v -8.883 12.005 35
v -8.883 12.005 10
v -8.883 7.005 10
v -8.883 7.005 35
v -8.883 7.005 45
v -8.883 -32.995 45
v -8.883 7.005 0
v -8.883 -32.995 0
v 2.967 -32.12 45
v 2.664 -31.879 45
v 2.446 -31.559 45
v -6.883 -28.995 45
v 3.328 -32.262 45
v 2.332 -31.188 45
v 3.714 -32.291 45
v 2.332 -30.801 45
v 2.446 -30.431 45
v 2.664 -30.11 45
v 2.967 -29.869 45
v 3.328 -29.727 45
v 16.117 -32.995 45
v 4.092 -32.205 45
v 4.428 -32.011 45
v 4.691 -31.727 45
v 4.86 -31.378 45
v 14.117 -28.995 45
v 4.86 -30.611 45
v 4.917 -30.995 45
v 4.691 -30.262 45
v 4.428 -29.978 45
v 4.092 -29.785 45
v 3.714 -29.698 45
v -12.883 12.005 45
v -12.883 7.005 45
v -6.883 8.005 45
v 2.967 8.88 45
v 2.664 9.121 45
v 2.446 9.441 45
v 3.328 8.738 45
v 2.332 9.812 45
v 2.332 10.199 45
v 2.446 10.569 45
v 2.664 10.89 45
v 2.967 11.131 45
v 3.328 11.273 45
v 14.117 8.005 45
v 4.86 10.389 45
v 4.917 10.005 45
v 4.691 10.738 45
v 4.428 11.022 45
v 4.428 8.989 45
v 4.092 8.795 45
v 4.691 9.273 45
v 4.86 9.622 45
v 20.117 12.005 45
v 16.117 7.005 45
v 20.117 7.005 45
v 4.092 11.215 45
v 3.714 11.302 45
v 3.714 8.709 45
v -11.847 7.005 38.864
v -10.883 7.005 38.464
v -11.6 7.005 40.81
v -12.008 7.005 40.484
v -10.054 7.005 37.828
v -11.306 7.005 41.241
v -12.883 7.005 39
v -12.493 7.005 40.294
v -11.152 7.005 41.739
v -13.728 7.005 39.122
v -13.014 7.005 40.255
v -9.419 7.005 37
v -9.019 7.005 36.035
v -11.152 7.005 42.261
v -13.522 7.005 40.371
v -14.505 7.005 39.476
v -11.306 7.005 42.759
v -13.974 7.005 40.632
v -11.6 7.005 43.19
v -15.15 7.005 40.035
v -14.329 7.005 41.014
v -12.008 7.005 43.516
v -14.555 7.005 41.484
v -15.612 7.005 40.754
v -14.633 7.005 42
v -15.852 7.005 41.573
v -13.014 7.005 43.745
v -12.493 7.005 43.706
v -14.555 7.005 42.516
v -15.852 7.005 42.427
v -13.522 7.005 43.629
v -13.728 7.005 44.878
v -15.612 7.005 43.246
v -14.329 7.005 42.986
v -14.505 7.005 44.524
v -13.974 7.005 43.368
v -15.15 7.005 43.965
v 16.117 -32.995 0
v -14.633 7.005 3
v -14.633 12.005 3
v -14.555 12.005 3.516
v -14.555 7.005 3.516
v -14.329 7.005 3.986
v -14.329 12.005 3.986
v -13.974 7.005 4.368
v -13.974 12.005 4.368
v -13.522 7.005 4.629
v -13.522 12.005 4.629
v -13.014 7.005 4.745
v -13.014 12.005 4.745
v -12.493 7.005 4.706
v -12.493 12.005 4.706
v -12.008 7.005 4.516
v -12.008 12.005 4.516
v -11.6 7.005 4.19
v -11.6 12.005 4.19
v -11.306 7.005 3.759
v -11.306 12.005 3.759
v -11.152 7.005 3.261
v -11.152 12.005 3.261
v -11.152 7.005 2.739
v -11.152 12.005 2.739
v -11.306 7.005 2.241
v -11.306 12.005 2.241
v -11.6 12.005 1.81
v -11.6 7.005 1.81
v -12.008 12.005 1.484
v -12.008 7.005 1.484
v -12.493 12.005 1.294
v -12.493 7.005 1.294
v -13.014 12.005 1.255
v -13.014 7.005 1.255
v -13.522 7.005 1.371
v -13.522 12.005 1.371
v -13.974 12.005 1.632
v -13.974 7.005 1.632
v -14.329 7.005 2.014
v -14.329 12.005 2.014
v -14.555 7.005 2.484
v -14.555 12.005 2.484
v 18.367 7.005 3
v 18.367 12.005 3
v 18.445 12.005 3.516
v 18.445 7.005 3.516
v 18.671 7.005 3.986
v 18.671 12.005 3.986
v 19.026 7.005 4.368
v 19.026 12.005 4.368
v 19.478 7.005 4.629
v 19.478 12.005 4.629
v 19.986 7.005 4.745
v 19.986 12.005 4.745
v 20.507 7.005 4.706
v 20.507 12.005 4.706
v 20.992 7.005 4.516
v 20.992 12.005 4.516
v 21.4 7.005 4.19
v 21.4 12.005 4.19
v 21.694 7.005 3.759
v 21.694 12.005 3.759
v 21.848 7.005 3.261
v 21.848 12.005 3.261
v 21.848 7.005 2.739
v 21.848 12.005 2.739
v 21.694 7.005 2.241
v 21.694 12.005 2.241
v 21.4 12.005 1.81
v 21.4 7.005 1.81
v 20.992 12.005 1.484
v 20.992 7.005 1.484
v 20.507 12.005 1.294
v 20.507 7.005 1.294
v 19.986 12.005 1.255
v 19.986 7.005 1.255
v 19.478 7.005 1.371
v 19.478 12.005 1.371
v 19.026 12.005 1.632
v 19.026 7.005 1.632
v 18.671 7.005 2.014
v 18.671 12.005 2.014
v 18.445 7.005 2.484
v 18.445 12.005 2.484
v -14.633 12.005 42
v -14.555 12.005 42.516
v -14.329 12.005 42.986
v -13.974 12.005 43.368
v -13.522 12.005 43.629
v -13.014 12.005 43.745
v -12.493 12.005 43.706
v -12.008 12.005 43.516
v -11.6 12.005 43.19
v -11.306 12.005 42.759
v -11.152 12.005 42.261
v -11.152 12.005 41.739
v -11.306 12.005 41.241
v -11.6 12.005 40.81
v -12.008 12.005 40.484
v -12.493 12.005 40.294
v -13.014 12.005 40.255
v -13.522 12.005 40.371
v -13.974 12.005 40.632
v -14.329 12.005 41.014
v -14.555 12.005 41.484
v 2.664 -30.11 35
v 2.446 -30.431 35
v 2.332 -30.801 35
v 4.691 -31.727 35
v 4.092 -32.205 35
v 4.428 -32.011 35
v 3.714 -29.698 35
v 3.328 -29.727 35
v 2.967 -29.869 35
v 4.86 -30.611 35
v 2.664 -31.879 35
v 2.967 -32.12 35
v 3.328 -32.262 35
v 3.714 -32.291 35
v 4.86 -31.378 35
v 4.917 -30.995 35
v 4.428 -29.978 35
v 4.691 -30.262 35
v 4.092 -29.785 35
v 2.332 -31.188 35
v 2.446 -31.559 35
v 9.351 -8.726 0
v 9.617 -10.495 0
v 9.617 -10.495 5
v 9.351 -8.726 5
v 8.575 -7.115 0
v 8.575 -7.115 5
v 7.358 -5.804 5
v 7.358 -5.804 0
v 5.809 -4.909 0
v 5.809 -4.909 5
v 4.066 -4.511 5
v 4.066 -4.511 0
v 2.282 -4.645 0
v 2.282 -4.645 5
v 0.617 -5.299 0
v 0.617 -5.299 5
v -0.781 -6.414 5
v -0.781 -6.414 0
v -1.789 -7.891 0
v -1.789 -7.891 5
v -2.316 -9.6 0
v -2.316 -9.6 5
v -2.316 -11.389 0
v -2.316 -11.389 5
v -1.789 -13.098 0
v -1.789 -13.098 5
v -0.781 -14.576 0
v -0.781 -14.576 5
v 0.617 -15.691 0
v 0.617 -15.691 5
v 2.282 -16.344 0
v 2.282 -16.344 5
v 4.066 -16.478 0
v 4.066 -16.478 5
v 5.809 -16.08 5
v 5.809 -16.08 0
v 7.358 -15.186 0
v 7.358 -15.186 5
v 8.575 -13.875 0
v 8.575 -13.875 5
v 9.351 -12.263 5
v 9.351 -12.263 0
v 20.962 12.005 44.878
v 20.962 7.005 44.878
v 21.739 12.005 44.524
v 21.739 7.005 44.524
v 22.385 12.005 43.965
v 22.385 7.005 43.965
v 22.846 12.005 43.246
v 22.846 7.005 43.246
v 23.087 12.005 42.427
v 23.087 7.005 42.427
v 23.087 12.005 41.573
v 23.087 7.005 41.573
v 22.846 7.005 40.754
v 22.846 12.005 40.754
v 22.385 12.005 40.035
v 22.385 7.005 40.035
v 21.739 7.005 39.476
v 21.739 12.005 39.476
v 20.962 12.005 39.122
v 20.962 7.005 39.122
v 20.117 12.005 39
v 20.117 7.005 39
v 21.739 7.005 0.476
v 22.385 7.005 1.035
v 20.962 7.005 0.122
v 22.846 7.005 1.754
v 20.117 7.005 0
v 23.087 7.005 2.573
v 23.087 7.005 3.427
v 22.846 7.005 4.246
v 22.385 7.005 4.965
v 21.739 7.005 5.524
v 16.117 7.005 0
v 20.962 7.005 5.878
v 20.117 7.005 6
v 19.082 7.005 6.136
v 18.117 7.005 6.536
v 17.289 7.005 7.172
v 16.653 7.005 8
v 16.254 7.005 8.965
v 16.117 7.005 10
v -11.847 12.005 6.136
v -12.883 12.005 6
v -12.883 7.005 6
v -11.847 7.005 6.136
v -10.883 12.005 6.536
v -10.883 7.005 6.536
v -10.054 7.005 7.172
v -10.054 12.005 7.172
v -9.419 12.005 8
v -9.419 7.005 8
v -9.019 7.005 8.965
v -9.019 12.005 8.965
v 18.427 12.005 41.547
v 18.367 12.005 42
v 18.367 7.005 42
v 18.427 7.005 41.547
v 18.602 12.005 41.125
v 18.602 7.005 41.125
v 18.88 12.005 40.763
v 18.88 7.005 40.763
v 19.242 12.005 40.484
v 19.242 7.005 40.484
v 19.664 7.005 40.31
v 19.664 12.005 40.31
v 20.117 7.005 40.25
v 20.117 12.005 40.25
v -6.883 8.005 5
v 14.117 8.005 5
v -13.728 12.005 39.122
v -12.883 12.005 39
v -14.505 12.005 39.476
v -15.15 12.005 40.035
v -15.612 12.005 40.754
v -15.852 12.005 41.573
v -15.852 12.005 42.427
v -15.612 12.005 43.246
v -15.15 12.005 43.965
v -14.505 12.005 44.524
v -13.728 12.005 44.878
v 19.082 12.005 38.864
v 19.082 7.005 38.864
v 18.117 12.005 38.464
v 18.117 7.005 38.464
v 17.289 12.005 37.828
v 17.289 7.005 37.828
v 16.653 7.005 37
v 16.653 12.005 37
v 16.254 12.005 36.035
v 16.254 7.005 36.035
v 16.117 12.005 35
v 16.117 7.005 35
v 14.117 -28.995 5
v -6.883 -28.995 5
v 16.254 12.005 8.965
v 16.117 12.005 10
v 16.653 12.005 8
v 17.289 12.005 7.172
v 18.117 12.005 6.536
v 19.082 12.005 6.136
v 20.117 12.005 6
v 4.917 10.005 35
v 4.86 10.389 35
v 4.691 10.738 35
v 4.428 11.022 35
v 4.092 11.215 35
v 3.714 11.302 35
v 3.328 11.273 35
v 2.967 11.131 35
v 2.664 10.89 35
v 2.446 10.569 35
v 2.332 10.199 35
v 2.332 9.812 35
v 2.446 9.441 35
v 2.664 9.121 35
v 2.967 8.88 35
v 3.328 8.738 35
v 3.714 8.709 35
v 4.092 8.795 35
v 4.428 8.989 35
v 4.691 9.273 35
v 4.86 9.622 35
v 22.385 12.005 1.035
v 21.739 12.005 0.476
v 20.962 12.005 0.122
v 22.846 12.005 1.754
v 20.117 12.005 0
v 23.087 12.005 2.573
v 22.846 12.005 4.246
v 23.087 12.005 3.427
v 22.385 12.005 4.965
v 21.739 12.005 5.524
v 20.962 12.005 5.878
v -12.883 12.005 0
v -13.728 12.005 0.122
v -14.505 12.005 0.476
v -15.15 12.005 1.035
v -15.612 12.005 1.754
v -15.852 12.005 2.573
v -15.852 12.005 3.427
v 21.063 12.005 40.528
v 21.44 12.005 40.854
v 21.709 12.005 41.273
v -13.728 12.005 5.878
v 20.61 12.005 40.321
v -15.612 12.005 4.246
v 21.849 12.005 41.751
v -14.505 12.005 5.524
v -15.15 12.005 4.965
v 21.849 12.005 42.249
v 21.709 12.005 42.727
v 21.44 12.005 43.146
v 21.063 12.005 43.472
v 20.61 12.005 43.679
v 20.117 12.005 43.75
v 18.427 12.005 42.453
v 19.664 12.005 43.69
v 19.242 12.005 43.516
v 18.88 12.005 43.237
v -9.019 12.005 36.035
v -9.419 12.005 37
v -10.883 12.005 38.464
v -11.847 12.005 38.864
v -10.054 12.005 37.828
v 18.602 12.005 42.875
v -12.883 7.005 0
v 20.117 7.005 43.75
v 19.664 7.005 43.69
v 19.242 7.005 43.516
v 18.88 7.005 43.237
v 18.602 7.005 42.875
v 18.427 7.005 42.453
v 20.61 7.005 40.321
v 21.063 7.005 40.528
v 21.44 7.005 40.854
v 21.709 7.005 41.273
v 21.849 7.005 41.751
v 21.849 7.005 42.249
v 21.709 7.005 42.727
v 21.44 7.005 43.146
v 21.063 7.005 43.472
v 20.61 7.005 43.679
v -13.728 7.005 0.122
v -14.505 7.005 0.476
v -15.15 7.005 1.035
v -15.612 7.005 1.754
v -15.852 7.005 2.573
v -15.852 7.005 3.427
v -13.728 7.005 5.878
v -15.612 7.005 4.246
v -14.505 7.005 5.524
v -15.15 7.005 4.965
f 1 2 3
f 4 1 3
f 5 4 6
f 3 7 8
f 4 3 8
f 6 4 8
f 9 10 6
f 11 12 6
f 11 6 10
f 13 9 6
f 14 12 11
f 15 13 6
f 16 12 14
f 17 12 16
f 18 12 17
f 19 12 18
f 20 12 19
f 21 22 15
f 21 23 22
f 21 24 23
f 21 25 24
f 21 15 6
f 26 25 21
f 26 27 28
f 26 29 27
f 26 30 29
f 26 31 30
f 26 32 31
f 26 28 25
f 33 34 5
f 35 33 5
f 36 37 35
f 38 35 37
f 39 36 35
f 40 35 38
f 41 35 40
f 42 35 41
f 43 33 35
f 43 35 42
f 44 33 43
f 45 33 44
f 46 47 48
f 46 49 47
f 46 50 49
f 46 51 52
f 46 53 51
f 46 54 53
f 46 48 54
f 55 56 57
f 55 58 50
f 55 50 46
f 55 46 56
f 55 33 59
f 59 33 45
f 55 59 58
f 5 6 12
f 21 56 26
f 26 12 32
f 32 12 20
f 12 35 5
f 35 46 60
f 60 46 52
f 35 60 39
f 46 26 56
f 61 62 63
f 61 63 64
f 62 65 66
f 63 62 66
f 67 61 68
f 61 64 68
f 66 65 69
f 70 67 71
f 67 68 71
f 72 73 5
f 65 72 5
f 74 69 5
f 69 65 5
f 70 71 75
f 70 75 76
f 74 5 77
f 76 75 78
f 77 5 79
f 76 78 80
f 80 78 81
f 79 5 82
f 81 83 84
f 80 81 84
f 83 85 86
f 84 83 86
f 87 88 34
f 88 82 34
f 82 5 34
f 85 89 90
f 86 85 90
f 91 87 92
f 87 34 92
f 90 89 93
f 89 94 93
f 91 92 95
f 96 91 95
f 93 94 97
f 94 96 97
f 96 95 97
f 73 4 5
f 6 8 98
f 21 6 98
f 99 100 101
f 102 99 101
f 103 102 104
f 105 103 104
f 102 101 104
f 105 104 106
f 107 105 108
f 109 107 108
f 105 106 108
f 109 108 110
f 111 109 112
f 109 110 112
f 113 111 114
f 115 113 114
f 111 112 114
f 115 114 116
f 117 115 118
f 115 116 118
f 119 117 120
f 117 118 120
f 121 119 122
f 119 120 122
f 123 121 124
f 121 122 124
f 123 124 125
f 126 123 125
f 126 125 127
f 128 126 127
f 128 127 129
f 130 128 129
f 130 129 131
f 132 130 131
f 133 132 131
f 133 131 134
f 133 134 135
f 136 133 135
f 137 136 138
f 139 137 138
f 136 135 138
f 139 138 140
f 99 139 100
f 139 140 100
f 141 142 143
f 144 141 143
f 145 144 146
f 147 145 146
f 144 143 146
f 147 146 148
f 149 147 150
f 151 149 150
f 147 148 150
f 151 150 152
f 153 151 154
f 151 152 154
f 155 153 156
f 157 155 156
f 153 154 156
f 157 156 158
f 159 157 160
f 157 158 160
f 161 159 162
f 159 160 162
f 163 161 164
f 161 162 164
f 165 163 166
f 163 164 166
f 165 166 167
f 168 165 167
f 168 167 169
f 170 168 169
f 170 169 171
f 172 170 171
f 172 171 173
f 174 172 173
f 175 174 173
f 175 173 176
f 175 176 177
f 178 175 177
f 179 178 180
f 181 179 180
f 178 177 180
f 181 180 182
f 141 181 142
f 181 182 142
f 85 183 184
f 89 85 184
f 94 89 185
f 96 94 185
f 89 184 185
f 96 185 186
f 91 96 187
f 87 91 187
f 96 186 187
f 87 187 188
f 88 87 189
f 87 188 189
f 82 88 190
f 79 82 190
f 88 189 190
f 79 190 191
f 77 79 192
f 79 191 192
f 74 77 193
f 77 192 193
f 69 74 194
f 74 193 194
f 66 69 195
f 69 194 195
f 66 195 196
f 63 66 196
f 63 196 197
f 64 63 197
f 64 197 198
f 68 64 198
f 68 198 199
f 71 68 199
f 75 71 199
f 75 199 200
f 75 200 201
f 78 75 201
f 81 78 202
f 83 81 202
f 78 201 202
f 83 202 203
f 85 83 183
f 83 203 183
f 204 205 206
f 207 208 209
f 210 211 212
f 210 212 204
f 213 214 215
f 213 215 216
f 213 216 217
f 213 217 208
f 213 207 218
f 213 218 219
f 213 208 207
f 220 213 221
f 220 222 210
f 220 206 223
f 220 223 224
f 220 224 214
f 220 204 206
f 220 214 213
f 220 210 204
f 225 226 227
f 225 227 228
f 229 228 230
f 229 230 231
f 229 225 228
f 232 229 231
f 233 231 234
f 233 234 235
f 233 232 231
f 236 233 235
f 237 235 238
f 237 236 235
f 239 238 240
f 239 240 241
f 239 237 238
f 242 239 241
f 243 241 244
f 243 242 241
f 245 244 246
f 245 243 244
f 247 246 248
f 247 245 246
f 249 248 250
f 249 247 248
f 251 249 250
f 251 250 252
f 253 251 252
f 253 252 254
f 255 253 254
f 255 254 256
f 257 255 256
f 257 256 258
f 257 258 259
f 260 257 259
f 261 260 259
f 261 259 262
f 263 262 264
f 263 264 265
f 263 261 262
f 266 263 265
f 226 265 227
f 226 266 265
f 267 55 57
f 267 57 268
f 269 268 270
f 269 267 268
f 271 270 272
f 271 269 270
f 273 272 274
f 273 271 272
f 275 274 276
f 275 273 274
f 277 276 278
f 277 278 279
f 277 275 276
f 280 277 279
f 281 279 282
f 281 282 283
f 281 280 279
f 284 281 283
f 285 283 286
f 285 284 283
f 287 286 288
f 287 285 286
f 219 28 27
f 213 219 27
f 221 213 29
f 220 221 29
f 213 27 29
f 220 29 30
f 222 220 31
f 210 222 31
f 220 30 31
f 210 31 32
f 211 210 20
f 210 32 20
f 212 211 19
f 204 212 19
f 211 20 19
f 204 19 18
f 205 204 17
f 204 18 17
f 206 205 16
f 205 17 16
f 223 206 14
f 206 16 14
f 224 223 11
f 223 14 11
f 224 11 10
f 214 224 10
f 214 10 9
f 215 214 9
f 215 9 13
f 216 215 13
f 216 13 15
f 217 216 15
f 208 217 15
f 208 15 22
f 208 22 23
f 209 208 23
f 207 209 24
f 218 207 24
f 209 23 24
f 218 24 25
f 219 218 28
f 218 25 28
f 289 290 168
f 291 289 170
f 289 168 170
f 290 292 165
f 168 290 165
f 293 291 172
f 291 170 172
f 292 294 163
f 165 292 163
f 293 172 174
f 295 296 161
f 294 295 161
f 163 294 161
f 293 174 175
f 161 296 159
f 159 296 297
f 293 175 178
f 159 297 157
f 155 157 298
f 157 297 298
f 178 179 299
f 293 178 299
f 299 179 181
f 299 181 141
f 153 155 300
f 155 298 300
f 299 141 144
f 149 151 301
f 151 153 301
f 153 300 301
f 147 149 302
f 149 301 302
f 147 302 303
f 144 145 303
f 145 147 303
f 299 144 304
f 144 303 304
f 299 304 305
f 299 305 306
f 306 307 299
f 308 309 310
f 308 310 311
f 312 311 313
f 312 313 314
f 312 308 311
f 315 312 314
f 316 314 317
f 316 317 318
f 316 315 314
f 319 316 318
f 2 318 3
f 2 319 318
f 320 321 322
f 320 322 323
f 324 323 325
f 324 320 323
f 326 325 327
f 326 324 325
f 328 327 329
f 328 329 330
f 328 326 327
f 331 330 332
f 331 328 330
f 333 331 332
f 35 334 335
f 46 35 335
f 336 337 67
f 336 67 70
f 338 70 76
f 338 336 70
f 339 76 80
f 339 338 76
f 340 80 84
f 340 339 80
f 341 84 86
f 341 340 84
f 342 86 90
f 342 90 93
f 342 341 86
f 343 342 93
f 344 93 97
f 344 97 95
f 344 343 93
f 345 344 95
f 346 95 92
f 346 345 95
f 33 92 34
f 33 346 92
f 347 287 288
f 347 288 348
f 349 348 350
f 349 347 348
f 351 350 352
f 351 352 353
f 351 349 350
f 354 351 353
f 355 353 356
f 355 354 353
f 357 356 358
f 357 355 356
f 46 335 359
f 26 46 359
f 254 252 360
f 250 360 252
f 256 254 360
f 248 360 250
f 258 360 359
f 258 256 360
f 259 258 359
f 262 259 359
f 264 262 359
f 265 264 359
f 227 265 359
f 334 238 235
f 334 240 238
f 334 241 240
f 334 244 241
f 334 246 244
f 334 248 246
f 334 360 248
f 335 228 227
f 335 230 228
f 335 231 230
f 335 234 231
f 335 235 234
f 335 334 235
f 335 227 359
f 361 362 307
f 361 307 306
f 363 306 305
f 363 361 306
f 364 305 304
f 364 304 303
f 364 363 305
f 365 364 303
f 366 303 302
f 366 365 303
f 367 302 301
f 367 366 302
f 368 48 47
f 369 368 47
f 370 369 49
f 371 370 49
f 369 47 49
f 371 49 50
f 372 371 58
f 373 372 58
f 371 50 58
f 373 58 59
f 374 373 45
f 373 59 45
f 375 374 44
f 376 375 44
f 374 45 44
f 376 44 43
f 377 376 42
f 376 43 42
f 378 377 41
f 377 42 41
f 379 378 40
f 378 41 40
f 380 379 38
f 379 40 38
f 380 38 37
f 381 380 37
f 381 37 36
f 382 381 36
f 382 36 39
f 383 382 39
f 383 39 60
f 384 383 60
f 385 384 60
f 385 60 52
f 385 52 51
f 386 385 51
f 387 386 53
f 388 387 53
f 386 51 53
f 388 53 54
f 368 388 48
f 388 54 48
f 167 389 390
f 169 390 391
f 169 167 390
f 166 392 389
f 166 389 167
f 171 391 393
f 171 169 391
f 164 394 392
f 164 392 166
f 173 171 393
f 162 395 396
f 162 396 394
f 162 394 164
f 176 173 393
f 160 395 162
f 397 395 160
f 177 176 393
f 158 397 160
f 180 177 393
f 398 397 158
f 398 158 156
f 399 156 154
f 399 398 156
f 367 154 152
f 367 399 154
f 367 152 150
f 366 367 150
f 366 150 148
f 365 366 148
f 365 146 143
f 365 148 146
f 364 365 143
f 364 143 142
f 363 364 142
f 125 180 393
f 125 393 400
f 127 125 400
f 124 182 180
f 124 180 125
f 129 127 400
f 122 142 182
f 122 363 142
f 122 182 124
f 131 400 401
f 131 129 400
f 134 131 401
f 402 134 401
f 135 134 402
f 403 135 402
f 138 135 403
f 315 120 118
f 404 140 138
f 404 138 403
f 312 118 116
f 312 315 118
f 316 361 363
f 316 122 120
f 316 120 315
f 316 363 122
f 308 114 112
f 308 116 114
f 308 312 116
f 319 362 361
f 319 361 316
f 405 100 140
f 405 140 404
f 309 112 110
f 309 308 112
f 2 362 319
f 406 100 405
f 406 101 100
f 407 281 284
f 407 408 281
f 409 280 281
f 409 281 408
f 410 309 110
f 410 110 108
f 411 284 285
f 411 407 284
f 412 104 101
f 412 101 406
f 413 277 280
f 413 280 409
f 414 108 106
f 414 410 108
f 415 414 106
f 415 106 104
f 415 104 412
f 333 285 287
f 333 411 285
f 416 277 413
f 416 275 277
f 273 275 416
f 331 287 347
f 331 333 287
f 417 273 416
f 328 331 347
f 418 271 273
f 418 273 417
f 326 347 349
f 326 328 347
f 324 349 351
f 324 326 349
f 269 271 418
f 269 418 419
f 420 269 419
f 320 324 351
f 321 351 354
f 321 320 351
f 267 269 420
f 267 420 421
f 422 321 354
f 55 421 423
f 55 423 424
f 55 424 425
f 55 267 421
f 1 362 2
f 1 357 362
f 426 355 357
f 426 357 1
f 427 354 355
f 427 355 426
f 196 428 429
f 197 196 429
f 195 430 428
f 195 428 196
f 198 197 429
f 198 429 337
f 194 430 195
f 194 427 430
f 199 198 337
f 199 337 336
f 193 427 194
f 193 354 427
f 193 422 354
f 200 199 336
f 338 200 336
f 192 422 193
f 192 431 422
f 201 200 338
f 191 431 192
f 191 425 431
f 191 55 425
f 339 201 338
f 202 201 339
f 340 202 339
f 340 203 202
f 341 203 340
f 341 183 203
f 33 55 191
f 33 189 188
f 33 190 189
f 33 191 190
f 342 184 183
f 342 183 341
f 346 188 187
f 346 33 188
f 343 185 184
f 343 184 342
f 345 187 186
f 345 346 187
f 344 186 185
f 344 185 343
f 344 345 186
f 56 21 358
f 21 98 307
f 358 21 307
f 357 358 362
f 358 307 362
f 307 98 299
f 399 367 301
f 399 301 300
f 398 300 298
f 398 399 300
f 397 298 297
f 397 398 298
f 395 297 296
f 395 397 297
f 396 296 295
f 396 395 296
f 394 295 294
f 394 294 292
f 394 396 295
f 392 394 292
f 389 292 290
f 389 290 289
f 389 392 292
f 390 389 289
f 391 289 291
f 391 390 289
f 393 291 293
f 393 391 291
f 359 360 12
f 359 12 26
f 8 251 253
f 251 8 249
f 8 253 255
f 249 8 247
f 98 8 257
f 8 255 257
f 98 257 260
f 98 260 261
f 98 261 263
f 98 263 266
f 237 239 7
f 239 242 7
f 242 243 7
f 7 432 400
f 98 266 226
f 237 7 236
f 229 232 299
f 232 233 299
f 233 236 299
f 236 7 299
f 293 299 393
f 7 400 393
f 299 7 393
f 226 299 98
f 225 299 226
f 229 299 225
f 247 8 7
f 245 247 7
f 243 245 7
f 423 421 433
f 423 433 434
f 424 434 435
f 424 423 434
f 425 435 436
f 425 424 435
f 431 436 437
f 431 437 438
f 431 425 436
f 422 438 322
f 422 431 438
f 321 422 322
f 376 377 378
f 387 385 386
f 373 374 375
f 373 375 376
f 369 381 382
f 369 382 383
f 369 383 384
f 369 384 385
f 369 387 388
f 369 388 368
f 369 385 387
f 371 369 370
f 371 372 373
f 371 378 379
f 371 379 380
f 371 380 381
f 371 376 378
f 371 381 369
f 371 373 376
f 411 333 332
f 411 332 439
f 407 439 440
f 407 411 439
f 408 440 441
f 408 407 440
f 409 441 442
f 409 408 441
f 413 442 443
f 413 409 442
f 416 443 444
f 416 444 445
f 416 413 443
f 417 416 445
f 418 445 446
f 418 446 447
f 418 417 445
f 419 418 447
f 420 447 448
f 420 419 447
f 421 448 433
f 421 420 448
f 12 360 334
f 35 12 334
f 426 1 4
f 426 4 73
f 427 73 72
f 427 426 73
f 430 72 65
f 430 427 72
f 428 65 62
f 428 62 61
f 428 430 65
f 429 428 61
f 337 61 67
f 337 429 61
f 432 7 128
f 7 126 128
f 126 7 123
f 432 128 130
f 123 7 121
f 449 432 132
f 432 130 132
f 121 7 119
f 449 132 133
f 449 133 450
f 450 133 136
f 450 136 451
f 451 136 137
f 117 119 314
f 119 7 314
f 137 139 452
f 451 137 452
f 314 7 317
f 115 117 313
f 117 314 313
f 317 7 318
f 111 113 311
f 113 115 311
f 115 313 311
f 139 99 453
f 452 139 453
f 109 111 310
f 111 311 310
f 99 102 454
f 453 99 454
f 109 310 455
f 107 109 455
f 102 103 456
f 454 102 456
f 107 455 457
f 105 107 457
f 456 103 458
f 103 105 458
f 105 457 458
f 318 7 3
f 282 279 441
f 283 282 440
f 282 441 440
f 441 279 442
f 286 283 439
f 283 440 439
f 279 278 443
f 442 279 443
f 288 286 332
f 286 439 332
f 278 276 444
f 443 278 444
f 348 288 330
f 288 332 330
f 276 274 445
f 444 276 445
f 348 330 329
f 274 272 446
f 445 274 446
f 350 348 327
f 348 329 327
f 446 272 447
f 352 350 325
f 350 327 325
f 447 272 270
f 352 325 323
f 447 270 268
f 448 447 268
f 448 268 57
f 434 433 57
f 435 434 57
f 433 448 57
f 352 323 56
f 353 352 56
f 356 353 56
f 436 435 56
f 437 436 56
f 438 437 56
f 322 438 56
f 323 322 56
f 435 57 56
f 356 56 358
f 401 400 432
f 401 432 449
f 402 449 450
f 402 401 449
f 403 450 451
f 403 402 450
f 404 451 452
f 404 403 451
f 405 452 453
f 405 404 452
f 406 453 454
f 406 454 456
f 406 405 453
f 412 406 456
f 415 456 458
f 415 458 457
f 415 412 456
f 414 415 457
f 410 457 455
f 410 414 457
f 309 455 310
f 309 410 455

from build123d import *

# Parameters (mm, degrees)
F0_W     = 21
F0_H     = 37
F0_R     = 6
F0_H_2   = 4
F1_DEPTH = 5
F2_DEPTH = 45
F3_R     = 1.75
F4_DEPTH = 5
F5_R     = 1.3
F6_DEPTH = 10


with BuildPart() as f1:
    # F0 (on Top) → F1 (new body)
    with BuildSketch(Plane.XY):
        with Locations((3.617266193, -10.4946532761)):
            Rectangle(F0_W, F0_H)
        with Locations((3.617266193, -10.4946532761)):
            Circle(F0_R, mode=Mode.SUBTRACT)
        Polygon((16.117266193, 12.0053467239), (-8.882733807, 12.0053467239), (-8.882733807, 8.0053467239), (-6.882733807, 8.0053467239), (14.117266193, 8.0053467239), (16.117266193, 8.0053467239), align=None)
        Polygon((-6.882733807, 8.0053467239), (-8.882733807, 8.0053467239), (-8.882733807, -32.9946532761), (-6.882733807, -32.9946532761), (-6.882733807, -28.9946532761), align=None)
        Polygon((16.117266193, -32.9946532761), (16.117266193, 8.0053467239), (14.117266193, 8.0053467239), (14.117266193, -28.9946532761), (14.117266193, -32.9946532761), align=None)
        with Locations((3.617266193, -30.9946532761)):
            Rectangle(F0_W, F0_H_2)
    extrude(amount=F1_DEPTH)

    # F0 (on Top) → F2 (join)
    with BuildSketch(Plane.XY):
        Polygon((16.117266193, 12.0053467239), (-8.882733807, 12.0053467239), (-8.882733807, 8.0053467239), (-6.882733807, 8.0053467239), (14.117266193, 8.0053467239), (16.117266193, 8.0053467239), align=None)
        Polygon((-6.882733807, 8.0053467239), (-8.882733807, 8.0053467239), (-8.882733807, -32.9946532761), (-6.882733807, -32.9946532761), (-6.882733807, -28.9946532761), align=None)
        Polygon((16.117266193, -32.9946532761), (16.117266193, 8.0053467239), (14.117266193, 8.0053467239), (14.117266193, -28.9946532761), (14.117266193, -32.9946532761), align=None)
        with Locations((3.617266193, -30.9946532761)):
            Rectangle(F0_W, F0_H_2)
    extrude(amount=F2_DEPTH)

    # F3 (on face) → F4 (join)
    with BuildSketch(Plane(origin=(0, 12.0053467239, 0), x_dir=(-1, 0, 0), z_dir=(0, 1, 0))):
        with BuildLine():
            Line((-16.117266193, 35), (-16.117266193, 39))
            Line((-16.117266193, 39), (-20.117266193, 39))
            ThreePointArc((-20.117266193, 39), (-17.2888390683, 37.8284271247), (-16.117266193, 35))
        make_face()
        with BuildLine():
            Line((-16.117266193, 39), (-16.117266193, 45))
            Line((-16.117266193, 45), (-20.117266193, 45))
            Line((-20.117266193, 45), (-20.117266193, 43.75))
            ThreePointArc((-20.117266193, 43.75), (-18.879829326, 43.2374368671), (-18.367266193, 42))
            ThreePointArc((-18.367266193, 42), (-18.879829326, 40.7625631329), (-20.117266193, 40.25))
            Line((-20.117266193, 40.25), (-20.117266193, 39))
            Line((-20.117266193, 39), (-16.117266193, 39))
        make_face()
        with BuildLine():
            Line((-20.117266193, 43.75), (-20.117266193, 45))
            ThreePointArc((-20.117266193, 45), (-23.117266193, 42), (-20.117266193, 39))
            Line((-20.117266193, 39), (-20.117266193, 40.25))
            ThreePointArc((-20.117266193, 40.25), (-21.867266193, 42), (-20.117266193, 43.75))
        make_face()
        with BuildLine():
            Line((12.882733807, 45), (8.882733807, 45))
            Line((8.882733807, 45), (8.882733807, 39))
            Line((8.882733807, 39), (12.882733807, 39))
            ThreePointArc((12.882733807, 39), (15.882733807, 42), (12.882733807, 45))
        make_face()
        with Locations((12.882733807, 42)):
            Circle(F3_R, mode=Mode.SUBTRACT)
        with BuildLine():
            Line((12.882733807, 39), (8.882733807, 39))
            Line((8.882733807, 39), (8.882733807, 35))
            ThreePointArc((8.882733807, 35), (10.0543066822, 37.8284271247), (12.882733807, 39))
        make_face()
        with BuildLine():
            ThreePointArc((12.882733807, 0), (15.882733807, 3), (12.882733807, 6))
            Line((12.882733807, 6), (8.882733807, 6))
            Line((8.882733807, 6), (8.882733807, 0))
            Line((8.882733807, 0), (12.882733807, 0))
        make_face()
        with Locations((12.882733807, 3)):
            Circle(F3_R, mode=Mode.SUBTRACT)
        with BuildLine():
            ThreePointArc((12.882733807, 6), (10.0543066822, 7.1715728753), (8.882733807, 10))
            Line((8.882733807, 10), (8.882733807, 6))
            Line((8.882733807, 6), (12.882733807, 6))
        make_face()
        with BuildLine():
            Line((-16.117266193, 6), (-16.117266193, 10))
            ThreePointArc((-16.117266193, 10), (-17.2888390683, 7.1715728753), (-20.117266193, 6))
            Line((-20.117266193, 6), (-16.117266193, 6))
        make_face()
        with BuildLine():
            Line((-16.117266193, 6), (-20.117266193, 6))
            ThreePointArc((-20.117266193, 6), (-23.117266193, 3), (-20.117266193, 0))
            Line((-20.117266193, 0), (-16.117266193, 0))
            Line((-16.117266193, 0), (-16.117266193, 6))
        make_face()
        with Locations((-20.117266193, 3)):
            Circle(F3_R, mode=Mode.SUBTRACT)
    extrude(amount=-F4_DEPTH)

    # F5 (on face) → F6 (cut)
    with BuildSketch(Plane.XY.offset(45)):
        with Locations((3.617266193, 10.0053467239)):
            Circle(F5_R)
        with Locations((3.617266193, -30.9946532761)):
            Circle(F5_R)
    extrude(amount=-F6_DEPTH, mode=Mode.SUBTRACT)


solid = f1.part
